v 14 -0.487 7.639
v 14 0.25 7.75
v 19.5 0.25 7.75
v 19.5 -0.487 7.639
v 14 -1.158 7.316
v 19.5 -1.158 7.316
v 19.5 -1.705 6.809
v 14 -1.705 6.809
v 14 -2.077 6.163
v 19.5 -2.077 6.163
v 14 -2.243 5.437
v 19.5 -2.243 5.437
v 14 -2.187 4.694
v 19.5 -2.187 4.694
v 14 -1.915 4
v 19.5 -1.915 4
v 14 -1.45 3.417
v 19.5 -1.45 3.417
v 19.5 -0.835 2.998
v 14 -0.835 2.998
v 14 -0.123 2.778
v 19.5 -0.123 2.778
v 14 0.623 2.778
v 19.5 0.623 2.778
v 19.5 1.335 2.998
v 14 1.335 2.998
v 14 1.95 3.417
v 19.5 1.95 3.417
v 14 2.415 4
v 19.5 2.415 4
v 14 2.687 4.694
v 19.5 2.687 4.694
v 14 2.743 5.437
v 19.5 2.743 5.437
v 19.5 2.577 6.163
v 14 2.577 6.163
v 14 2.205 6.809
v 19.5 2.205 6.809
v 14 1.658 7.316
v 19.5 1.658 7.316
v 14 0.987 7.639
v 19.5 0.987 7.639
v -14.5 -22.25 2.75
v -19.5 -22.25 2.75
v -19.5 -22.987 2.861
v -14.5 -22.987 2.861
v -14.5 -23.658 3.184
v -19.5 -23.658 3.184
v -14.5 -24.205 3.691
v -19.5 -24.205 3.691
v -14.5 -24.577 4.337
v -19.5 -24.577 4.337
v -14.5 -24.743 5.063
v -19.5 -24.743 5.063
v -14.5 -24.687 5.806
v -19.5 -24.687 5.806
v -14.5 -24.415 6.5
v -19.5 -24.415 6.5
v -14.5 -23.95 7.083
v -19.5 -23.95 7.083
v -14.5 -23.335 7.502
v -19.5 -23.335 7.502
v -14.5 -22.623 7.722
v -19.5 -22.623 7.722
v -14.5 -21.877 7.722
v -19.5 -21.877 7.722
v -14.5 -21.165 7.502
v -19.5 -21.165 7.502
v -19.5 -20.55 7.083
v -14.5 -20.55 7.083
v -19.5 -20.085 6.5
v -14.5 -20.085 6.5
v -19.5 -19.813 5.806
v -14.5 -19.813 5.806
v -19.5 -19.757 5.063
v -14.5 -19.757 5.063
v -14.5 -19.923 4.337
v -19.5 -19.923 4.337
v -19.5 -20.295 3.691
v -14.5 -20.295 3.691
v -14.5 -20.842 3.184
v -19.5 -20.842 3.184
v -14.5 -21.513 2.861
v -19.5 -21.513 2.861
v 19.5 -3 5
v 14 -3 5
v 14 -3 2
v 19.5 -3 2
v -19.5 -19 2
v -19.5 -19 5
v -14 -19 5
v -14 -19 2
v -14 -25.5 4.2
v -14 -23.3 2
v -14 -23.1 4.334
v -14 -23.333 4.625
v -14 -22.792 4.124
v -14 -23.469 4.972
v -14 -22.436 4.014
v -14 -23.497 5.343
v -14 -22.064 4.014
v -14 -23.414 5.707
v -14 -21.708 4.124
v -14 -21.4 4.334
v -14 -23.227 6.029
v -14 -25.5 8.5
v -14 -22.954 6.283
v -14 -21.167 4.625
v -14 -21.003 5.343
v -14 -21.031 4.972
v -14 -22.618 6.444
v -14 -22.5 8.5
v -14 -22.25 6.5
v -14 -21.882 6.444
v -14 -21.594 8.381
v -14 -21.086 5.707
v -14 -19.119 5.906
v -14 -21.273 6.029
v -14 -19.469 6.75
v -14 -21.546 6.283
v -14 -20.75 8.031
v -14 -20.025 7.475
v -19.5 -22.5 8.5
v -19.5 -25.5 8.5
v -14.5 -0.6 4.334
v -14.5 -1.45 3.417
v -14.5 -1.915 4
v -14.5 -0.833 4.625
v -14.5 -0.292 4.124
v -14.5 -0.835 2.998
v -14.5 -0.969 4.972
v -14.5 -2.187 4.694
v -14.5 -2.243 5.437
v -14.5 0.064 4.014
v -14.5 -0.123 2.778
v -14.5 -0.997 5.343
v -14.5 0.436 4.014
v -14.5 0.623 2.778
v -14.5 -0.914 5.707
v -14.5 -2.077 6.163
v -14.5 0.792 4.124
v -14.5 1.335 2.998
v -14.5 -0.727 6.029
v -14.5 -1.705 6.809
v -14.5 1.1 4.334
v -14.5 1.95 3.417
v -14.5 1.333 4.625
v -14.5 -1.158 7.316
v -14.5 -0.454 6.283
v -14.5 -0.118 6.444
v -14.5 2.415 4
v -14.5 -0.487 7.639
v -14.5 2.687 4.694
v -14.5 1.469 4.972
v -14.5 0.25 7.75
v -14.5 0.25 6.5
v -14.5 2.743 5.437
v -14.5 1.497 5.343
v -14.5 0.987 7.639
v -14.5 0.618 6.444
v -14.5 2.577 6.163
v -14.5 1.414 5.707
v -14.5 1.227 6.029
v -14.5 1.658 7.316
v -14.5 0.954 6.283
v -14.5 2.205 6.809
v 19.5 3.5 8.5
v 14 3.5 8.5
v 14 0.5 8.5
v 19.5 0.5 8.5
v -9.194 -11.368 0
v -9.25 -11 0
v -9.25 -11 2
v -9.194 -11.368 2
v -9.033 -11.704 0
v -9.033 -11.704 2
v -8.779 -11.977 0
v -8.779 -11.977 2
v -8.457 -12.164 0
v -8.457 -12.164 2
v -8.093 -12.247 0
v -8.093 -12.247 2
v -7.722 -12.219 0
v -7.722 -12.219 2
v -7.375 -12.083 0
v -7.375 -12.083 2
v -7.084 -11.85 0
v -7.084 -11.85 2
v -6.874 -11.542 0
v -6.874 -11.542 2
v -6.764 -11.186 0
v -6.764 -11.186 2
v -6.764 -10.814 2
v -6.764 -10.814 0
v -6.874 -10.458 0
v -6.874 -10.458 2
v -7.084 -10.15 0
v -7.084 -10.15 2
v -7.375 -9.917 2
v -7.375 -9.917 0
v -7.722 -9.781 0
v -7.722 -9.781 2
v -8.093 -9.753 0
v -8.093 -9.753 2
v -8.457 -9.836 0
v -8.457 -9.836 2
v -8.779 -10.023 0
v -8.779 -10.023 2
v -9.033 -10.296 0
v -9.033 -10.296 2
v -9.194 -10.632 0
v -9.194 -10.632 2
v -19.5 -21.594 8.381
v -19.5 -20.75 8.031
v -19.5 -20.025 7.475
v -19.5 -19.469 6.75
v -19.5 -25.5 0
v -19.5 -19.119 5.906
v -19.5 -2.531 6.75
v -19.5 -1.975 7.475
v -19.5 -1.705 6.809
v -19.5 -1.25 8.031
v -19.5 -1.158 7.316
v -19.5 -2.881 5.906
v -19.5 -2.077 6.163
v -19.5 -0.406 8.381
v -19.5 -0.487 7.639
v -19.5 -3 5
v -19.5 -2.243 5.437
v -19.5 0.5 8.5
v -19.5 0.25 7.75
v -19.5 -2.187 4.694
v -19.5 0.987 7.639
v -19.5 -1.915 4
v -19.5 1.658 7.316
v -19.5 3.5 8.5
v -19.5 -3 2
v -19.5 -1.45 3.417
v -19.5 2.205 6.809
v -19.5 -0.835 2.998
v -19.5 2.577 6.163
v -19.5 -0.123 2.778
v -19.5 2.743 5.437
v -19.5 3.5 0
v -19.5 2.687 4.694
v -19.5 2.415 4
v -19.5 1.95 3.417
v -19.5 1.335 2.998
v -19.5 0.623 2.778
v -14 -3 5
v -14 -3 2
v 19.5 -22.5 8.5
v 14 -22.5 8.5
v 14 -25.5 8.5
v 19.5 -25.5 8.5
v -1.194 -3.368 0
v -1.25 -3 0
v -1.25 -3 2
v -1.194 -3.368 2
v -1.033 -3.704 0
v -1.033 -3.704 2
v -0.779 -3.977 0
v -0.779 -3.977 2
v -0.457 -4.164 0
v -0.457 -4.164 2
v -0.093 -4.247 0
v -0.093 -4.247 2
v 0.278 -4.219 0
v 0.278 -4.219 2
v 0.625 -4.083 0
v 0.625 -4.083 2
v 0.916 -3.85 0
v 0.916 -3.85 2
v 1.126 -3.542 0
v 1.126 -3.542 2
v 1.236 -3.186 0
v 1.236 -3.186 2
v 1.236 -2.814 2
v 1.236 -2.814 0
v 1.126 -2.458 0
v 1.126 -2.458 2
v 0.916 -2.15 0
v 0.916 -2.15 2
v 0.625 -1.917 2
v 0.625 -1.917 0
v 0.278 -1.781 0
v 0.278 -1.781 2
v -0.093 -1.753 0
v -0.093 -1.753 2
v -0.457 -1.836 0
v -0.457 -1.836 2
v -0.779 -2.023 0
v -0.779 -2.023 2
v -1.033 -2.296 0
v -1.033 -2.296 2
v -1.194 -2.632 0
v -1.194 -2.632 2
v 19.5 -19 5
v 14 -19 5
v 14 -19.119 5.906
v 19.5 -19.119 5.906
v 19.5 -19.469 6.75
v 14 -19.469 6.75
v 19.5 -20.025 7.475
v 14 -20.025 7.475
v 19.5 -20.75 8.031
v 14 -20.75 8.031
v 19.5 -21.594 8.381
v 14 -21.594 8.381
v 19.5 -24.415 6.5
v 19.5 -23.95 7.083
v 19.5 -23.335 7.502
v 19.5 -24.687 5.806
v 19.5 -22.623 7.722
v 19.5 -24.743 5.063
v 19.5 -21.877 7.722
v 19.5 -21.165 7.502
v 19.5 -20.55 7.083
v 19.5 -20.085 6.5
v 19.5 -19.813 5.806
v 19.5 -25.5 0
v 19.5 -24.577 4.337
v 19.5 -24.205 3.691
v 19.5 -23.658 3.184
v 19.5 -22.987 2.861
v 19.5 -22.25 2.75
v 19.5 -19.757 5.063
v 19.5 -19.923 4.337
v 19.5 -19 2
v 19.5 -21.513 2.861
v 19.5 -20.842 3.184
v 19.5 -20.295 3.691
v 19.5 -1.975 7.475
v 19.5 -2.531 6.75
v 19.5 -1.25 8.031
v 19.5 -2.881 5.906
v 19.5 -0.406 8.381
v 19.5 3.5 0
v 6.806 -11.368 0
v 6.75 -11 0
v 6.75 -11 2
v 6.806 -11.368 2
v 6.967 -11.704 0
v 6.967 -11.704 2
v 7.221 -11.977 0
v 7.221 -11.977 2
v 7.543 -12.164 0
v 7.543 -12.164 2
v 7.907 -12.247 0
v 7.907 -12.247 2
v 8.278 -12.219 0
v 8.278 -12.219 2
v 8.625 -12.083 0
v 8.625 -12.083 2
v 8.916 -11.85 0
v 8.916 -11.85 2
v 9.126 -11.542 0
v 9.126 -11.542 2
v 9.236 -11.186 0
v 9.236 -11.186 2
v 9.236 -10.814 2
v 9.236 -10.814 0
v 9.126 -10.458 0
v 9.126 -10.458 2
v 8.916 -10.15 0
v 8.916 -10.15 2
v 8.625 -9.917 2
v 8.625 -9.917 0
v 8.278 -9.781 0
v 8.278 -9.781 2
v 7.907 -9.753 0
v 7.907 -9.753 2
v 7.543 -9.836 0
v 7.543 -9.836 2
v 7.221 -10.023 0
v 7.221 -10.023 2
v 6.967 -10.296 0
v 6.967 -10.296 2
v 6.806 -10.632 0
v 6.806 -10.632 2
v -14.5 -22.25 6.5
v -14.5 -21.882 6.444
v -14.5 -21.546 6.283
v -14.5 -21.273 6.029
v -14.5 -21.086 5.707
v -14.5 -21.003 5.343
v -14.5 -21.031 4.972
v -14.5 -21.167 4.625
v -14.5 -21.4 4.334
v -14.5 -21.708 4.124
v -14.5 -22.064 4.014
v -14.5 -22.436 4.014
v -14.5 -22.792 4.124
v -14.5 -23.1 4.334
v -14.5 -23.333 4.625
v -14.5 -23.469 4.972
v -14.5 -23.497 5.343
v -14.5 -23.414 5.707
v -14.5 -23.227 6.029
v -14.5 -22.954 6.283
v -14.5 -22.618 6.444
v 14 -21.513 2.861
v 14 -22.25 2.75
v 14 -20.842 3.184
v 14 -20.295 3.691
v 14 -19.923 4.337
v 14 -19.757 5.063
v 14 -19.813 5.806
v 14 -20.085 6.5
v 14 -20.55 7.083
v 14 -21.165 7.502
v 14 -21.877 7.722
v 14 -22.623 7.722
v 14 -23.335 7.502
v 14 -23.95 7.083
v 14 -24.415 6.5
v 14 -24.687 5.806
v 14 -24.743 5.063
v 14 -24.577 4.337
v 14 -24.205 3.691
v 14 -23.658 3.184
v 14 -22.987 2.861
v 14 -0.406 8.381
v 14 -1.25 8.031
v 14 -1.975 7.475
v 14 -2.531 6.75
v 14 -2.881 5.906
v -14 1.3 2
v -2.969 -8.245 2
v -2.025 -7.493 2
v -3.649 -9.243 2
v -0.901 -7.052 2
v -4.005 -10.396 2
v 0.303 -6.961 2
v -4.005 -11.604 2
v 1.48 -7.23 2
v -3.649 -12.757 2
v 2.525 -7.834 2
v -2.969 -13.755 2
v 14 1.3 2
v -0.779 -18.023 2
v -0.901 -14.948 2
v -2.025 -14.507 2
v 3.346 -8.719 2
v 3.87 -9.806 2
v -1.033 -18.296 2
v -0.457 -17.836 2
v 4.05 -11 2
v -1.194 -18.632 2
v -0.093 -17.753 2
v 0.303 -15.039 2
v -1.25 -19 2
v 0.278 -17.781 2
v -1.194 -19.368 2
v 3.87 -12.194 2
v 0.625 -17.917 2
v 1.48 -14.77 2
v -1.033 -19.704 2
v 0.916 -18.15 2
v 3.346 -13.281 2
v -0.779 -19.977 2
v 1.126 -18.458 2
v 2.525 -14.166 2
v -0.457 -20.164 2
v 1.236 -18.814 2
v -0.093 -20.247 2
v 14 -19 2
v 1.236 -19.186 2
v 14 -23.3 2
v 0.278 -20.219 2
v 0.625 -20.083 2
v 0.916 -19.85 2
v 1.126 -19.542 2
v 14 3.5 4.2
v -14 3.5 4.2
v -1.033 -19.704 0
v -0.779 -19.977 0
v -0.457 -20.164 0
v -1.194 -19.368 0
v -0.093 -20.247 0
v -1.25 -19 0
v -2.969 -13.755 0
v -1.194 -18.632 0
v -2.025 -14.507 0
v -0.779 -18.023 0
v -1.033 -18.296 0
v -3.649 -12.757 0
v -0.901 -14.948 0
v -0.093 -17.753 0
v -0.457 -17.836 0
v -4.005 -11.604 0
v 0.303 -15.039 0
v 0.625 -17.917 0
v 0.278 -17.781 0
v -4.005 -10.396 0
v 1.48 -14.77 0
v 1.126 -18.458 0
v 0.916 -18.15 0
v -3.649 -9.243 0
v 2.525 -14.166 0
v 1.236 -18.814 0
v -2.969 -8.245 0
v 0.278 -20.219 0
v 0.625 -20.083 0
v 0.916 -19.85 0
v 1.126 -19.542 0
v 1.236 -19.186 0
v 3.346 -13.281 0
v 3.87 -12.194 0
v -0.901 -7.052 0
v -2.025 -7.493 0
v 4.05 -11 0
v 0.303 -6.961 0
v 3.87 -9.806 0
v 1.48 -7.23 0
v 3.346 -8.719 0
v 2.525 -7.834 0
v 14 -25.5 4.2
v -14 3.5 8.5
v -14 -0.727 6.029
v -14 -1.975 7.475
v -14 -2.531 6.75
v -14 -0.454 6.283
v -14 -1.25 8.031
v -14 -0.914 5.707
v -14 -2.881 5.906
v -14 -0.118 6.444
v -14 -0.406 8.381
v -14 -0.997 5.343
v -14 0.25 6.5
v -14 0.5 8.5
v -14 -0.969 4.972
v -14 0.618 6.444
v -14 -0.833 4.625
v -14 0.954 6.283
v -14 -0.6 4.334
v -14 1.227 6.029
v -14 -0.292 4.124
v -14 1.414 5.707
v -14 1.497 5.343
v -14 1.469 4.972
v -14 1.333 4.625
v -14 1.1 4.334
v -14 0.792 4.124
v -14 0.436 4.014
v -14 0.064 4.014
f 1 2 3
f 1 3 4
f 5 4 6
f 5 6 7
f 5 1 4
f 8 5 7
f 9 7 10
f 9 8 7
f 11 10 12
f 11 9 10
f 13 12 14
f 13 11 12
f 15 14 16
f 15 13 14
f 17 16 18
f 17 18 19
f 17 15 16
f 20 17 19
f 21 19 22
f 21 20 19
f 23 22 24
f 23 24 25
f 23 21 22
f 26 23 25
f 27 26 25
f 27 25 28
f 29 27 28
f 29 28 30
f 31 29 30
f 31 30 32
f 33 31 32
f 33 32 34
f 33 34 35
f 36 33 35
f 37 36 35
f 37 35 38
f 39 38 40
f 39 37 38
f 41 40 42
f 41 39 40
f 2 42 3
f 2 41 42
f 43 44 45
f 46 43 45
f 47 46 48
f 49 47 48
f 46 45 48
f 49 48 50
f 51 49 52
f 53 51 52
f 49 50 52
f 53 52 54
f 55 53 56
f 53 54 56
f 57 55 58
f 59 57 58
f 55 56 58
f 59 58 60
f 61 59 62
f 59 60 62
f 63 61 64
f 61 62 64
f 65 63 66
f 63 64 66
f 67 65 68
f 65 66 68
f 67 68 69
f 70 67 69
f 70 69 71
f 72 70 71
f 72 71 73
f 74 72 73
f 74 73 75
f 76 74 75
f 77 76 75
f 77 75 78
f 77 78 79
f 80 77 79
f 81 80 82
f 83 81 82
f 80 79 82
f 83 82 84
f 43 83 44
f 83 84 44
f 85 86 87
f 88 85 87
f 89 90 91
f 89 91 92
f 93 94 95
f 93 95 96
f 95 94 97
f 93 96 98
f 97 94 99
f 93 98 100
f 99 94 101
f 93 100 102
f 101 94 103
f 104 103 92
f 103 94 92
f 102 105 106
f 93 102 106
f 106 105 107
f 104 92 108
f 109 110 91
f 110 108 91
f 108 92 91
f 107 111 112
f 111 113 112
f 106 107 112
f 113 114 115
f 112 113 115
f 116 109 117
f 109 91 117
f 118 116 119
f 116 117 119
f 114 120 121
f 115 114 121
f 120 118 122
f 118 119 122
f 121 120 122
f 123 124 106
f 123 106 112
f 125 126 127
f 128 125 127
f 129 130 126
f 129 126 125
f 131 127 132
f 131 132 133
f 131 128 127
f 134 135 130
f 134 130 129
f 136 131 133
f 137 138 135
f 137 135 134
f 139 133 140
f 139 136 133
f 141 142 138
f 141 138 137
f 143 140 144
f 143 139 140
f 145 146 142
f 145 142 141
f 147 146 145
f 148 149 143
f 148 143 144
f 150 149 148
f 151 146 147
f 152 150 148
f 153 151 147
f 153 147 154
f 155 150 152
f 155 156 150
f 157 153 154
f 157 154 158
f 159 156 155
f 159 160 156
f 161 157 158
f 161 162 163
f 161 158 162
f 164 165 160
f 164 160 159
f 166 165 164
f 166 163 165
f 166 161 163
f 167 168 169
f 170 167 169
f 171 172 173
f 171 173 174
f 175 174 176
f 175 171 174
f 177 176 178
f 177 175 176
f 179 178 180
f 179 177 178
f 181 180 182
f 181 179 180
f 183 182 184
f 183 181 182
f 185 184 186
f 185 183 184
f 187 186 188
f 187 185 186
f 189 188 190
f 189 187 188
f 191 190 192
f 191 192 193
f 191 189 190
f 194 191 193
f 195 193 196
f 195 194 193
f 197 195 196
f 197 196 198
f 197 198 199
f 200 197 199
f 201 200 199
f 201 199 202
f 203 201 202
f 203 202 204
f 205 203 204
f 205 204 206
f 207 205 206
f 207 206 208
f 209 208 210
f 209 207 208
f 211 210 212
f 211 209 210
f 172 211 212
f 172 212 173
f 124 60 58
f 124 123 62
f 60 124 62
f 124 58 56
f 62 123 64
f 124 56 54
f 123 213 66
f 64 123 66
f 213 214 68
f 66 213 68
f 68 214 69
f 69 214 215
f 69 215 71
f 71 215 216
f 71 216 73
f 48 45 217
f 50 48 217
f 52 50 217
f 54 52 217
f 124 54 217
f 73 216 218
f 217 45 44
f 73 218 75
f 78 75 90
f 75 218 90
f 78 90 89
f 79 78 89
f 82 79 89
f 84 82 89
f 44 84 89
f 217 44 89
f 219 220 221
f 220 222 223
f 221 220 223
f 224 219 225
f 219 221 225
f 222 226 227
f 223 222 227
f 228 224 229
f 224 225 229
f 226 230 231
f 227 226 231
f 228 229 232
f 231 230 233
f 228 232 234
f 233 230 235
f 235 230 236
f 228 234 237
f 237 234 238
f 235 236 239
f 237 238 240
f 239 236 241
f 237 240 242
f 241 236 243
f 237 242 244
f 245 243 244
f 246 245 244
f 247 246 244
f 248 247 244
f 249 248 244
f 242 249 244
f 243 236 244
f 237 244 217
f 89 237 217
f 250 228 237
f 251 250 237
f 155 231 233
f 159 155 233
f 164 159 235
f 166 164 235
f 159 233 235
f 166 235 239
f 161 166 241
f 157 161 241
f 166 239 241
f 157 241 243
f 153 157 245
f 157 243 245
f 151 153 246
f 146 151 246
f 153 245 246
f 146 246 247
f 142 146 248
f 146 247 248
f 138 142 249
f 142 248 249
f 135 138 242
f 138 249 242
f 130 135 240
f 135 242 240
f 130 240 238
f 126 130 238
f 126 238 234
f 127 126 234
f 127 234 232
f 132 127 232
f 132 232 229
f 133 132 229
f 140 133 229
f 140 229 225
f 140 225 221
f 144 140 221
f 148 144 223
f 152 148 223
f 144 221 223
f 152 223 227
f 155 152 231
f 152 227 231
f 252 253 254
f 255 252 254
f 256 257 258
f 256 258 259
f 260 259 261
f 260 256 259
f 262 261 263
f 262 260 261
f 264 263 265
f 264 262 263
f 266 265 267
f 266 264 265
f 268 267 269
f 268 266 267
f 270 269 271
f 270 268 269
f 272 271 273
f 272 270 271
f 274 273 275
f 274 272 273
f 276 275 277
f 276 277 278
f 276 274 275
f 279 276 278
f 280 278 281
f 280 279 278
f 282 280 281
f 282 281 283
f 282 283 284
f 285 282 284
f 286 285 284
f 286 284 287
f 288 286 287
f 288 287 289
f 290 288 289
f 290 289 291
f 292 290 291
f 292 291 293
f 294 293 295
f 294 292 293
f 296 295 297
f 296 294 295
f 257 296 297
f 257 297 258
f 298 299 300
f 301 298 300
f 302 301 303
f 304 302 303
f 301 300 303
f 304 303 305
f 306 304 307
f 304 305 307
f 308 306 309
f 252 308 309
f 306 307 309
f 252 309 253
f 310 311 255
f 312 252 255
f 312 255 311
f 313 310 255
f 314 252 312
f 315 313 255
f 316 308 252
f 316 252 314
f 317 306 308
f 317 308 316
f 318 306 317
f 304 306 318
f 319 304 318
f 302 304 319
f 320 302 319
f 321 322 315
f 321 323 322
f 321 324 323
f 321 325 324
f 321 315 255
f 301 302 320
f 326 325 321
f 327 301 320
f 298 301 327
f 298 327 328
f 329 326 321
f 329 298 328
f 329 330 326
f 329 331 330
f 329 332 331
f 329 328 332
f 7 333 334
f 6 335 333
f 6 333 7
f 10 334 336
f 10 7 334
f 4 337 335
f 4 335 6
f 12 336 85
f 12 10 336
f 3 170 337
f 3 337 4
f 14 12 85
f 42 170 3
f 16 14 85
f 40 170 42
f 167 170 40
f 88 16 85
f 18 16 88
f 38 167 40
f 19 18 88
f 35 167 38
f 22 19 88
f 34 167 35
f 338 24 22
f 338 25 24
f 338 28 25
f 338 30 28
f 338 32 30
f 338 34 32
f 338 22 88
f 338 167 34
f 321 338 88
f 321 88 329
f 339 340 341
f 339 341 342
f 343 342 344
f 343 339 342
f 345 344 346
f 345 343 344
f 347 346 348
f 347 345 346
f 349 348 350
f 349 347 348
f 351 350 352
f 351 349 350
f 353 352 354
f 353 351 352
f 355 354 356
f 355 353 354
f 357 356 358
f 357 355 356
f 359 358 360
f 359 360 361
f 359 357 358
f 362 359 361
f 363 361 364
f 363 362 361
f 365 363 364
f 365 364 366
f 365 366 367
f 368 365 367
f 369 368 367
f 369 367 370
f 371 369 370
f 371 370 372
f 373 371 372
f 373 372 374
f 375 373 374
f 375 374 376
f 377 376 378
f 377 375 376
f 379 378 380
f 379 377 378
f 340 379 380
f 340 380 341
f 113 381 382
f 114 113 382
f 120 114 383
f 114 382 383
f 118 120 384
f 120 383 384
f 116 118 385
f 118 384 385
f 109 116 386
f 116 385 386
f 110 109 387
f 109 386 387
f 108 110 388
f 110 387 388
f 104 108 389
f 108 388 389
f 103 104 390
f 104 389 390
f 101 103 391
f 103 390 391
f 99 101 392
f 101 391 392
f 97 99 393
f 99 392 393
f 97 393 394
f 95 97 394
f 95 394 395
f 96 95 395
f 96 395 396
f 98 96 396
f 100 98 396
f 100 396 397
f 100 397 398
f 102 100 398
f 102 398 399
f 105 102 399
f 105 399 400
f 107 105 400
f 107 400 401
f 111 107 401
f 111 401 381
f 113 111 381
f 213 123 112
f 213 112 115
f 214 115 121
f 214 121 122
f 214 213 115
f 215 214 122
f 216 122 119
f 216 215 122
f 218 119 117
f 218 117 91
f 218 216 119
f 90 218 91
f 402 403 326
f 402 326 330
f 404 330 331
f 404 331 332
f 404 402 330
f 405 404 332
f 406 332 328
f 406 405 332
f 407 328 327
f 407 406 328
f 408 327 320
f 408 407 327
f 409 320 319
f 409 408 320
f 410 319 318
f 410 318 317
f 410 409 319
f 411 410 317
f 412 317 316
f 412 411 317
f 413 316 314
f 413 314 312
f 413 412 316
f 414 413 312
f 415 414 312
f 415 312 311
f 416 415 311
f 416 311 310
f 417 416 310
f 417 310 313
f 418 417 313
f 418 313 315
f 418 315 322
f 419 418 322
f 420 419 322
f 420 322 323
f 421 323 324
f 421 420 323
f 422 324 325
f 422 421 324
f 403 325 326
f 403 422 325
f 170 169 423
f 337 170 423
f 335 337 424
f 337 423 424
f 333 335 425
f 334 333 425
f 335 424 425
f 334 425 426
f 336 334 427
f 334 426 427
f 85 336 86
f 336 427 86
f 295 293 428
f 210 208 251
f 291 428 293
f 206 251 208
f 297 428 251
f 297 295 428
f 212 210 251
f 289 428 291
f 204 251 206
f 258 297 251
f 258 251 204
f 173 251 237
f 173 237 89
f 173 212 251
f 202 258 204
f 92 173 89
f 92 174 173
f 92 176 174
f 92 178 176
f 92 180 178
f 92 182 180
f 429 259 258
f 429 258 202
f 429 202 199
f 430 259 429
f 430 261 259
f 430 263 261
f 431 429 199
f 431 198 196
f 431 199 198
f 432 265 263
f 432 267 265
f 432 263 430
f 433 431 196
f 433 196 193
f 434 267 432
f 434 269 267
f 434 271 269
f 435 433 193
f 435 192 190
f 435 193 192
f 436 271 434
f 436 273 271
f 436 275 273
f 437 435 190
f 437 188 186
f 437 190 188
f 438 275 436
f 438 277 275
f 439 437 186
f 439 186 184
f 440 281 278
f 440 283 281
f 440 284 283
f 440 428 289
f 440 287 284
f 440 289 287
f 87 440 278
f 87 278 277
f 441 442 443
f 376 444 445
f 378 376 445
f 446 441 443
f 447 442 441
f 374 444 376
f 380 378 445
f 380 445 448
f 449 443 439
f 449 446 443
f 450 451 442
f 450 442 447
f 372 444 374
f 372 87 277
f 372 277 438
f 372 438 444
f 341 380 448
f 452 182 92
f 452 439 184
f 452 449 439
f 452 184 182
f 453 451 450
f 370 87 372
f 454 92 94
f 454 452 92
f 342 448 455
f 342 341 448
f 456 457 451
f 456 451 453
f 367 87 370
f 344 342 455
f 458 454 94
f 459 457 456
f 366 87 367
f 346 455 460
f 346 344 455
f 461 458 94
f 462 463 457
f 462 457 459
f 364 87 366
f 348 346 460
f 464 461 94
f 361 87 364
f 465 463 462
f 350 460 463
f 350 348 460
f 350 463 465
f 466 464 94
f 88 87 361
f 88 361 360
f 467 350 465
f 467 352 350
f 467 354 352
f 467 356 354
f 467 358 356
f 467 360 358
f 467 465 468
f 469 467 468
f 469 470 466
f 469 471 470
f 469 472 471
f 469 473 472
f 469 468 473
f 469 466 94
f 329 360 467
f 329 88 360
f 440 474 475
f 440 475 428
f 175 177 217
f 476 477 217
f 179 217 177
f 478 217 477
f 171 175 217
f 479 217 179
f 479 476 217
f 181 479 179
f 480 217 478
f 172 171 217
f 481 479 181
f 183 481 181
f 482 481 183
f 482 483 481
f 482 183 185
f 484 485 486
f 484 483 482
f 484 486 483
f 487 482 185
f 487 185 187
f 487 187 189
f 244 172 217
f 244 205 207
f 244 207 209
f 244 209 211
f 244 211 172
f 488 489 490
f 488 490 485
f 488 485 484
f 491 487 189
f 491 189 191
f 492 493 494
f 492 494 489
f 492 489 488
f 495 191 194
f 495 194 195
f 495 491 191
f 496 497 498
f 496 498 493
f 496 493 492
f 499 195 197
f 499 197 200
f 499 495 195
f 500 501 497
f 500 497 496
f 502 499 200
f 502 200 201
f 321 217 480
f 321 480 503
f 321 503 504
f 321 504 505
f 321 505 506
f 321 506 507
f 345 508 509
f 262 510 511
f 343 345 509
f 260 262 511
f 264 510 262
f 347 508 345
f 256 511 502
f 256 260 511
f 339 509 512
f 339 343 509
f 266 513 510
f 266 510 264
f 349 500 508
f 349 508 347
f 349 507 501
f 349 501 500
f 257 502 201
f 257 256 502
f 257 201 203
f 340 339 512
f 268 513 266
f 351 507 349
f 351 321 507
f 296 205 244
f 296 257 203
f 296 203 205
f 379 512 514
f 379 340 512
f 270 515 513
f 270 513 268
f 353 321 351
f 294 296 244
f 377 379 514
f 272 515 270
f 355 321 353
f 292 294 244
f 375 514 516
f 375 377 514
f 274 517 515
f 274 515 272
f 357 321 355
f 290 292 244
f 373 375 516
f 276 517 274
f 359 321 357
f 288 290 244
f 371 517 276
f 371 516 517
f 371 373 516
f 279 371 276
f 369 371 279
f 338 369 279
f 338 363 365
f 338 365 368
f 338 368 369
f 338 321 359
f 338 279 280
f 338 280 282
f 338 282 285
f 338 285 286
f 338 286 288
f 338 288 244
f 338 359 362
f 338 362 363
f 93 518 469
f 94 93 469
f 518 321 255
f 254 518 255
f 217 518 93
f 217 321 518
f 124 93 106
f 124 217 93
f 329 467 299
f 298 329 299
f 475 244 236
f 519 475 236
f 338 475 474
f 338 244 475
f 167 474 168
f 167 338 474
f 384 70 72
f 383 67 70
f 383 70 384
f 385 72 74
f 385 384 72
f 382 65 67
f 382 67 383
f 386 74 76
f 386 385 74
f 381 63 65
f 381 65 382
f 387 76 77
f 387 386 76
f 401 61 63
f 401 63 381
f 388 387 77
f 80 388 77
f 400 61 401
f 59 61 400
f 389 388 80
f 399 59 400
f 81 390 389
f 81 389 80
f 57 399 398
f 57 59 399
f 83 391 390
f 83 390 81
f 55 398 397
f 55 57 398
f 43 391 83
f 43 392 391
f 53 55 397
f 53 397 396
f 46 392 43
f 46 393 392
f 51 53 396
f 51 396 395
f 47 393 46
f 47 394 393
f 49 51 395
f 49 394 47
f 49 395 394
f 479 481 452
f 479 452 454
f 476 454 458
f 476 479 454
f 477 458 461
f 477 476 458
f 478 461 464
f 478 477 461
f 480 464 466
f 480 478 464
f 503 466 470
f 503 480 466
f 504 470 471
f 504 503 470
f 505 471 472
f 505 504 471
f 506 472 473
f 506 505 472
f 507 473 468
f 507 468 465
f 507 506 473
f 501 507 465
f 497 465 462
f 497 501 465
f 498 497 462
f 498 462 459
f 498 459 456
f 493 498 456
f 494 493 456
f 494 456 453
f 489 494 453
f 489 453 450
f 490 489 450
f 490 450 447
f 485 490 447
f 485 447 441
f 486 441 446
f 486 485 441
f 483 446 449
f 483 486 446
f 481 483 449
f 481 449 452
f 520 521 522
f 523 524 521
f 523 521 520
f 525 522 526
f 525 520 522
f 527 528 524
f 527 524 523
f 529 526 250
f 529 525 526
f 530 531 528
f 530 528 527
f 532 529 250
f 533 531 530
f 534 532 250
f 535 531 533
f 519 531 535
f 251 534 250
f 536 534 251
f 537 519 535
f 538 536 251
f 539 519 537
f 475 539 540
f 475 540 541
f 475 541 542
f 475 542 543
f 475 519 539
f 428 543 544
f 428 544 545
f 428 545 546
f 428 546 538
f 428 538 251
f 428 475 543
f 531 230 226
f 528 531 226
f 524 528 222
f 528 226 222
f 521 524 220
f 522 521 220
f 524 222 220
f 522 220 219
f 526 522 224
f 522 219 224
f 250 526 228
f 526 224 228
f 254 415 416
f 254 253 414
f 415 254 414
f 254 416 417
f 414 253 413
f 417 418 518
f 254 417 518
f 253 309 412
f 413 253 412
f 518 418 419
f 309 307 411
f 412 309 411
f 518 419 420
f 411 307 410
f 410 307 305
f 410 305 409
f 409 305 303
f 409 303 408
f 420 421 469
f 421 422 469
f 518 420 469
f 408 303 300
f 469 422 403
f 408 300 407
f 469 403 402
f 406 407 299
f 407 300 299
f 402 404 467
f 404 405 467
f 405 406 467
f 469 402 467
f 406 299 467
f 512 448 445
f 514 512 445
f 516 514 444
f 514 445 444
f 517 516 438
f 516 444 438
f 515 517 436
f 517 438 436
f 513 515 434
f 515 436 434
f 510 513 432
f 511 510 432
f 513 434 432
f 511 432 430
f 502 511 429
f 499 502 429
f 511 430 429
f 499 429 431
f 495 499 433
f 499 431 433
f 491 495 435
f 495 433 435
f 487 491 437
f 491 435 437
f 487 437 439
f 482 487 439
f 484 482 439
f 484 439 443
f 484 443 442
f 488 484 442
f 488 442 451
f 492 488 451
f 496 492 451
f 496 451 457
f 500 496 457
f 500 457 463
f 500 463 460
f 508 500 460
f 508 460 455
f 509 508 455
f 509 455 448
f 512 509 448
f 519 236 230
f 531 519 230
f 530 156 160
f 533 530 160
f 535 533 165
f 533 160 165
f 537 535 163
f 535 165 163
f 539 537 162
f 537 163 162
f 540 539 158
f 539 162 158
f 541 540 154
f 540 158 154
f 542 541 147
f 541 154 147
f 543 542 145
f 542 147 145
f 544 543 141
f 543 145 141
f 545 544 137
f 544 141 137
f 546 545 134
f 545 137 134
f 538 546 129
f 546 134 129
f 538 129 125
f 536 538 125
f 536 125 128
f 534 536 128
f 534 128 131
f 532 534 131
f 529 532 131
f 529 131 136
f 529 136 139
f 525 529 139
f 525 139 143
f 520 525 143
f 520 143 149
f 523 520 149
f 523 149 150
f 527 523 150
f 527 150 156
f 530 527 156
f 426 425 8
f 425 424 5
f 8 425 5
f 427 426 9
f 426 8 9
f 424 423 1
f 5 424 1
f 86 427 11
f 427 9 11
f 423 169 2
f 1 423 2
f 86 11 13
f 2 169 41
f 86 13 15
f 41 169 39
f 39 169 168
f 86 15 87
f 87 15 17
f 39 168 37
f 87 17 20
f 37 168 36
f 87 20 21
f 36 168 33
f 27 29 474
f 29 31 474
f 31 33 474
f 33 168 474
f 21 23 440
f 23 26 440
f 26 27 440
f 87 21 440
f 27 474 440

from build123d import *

# Parameters (mm, degrees)
SKETCH1_W           = 39
SKETCH1_H           = 23.712741858
BOSS_EXTRUDE1_DEPTH = 2
SKETCH9_R           = 4.05
CUT_EXTRUDE6_DEPTH  = 5
SKETCH10_R          = 1.25
BOSS_EXTRUDE5_DEPTH = 5.5
SKETCH11_R          = 2.5
CUT_EXTRUDE7_DEPTH  = 5
BOSS_EXTRUDE6_START = -5.5
SKETCH12_R          = 2.5
BOSS_EXTRUDE6_DEPTH = 5.5
BOSS_EXTRUDE7_DEPTH = 28


with BuildPart() as part:
    # Sketch1 → Boss-Extrude1 (new body)
    with BuildSketch(Plane.XY):
        with Locations((0, -11)):
            Rectangle(SKETCH1_W, SKETCH1_H)
        with BuildLine():
            ThreePointArc((1.25, -19), (0, -17.75), (-1.25, -19))
            ThreePointArc((-1.25, -19), (0, -20.25), (1.25, -19))
        make_face(mode=Mode.SUBTRACT)
        with BuildLine():
            ThreePointArc((-6.75, -11), (-8, -9.75), (-9.25, -11))
            ThreePointArc((-9.25, -11), (-8, -12.25), (-6.75, -11))
        make_face(mode=Mode.SUBTRACT)
        with BuildLine():
            ThreePointArc((1.25, -3), (0, -1.75), (-1.25, -3))
            ThreePointArc((-1.25, -3), (0, -4.25), (1.25, -3))
        make_face(mode=Mode.SUBTRACT)
        with BuildLine():
            ThreePointArc((9.25, -11), (8, -9.75), (6.75, -11))
            ThreePointArc((6.75, -11), (8, -12.25), (9.25, -11))
        make_face(mode=Mode.SUBTRACT)
    extrude(amount=BOSS_EXTRUDE1_DEPTH)

    # Sketch9 → Cut-Extrude6 (cut)
    with BuildSketch(Plane.XY.offset(2)):
        with Locations((0, -11)):
            Circle(SKETCH9_R)
    extrude(amount=-CUT_EXTRUDE6_DEPTH, mode=Mode.SUBTRACT)

    # Sketch10 → Boss-Extrude5 (add)
    # profile 1 of 2: a face of its own
    with BuildSketch(Plane.ZY.offset(19.5)):
        with BuildLine():
            Line((4.2, 3.5), (8.5, 3.5))
            Line((8.5, 3.5), (8.5, 0.5))
            ThreePointArc((8.5, 0.5), (7.474873734, -1.974873734), (5, -3))
            Line((5, -3), (2, -3))
            Line((2, -3), (2, 0.856370929))
            Line((2, 0.856370929), (0, 0.856370929))
            Line((0, 0.856370929), (0, 3.5))
            Line((0, 3.5), (4.2, 3.5))
        make_face()
        with Locations((5.25, 0.25)):
            Circle(SKETCH10_R, mode=Mode.SUBTRACT)
    # profile 2 of 2: a face of its own
    with BuildSketch(Plane.ZY.offset(19.5)):
        with BuildLine():
            Line((5, -19), (2, -19))
            Line((2, -19), (2, -22.856370929))
            Line((2, -22.856370929), (0, -22.856370929))
            Line((0, -22.856370929), (0, -25.5))
            Line((0, -25.5), (4.2, -25.5))
            Line((4.2, -25.5), (8.5, -25.5))
            Line((8.5, -25.5), (8.5, -22.5))
            ThreePointArc((8.5, -22.5), (7.474873734, -20.025126266), (5, -19))
        make_face()
        with Locations((5.25, -22.25)):
            Circle(SKETCH10_R, mode=Mode.SUBTRACT)
    extrude(amount=-BOSS_EXTRUDE5_DEPTH)

    # Sketch11 → Cut-Extrude7 (cut)
    with BuildSketch(Plane.ZY.offset(19.5)):
        with Locations((5.25, 0.25)):
            Circle(SKETCH11_R)
        with Locations(Location((5.25, -22.25, 0), (0, 0, 180))):
            Circle(SKETCH11_R)
    extrude(amount=-CUT_EXTRUDE7_DEPTH, mode=Mode.SUBTRACT)

    # Sketch12 → Boss-Extrude6 (add)
    with BuildSketch(Plane(origin=(19.5, 0, 0), x_dir=(0, 0, -1), z_dir=(1, 0, 0)).offset(BOSS_EXTRUDE6_START)):
        with BuildLine():
            ThreePointArc((-8.5, 0.5), (-7.474873734, -1.974873734), (-5, -3))
            Line((-5, -3), (-2, -3))
            Line((-2, -3), (-2, -19))
            Line((-2, -19), (-5, -19))
            ThreePointArc((-5, -19), (-7.474873734, -20.025126266), (-8.5, -22.5))
            Line((-8.5, -22.5), (-8.5, -25.5))
            Line((-8.5, -25.5), (0, -25.5))
            Line((0, -25.5), (0, 3.5))
            Line((0, 3.5), (-8.5, 3.5))
            Line((-8.5, 3.5), (-8.5, 0.5))
        make_face()
        with Locations((-5.25, -22.25)):
            Circle(SKETCH12_R, mode=Mode.SUBTRACT)
        with Locations(Location((-5.25, 0.25, 0), (0, 0, 180))):
            Circle(SKETCH12_R, mode=Mode.SUBTRACT)
    extrude(amount=BOSS_EXTRUDE6_DEPTH)

    # Sketch13 → Boss-Extrude7 (add)
    with BuildSketch(Plane.ZY.offset(-14)):
        Polygon((0, 3.5), (4.2, 3.5), (2, 1.3), (2, 0.856370929), (0, 0.856370929), align=None)
        Polygon((2, -22.856370929), (0, -22.856370929), (0, -25.5), (4.2, -25.5), (2, -23.3), align=None)
    extrude(amount=BOSS_EXTRUDE7_DEPTH)


solid = part.part
